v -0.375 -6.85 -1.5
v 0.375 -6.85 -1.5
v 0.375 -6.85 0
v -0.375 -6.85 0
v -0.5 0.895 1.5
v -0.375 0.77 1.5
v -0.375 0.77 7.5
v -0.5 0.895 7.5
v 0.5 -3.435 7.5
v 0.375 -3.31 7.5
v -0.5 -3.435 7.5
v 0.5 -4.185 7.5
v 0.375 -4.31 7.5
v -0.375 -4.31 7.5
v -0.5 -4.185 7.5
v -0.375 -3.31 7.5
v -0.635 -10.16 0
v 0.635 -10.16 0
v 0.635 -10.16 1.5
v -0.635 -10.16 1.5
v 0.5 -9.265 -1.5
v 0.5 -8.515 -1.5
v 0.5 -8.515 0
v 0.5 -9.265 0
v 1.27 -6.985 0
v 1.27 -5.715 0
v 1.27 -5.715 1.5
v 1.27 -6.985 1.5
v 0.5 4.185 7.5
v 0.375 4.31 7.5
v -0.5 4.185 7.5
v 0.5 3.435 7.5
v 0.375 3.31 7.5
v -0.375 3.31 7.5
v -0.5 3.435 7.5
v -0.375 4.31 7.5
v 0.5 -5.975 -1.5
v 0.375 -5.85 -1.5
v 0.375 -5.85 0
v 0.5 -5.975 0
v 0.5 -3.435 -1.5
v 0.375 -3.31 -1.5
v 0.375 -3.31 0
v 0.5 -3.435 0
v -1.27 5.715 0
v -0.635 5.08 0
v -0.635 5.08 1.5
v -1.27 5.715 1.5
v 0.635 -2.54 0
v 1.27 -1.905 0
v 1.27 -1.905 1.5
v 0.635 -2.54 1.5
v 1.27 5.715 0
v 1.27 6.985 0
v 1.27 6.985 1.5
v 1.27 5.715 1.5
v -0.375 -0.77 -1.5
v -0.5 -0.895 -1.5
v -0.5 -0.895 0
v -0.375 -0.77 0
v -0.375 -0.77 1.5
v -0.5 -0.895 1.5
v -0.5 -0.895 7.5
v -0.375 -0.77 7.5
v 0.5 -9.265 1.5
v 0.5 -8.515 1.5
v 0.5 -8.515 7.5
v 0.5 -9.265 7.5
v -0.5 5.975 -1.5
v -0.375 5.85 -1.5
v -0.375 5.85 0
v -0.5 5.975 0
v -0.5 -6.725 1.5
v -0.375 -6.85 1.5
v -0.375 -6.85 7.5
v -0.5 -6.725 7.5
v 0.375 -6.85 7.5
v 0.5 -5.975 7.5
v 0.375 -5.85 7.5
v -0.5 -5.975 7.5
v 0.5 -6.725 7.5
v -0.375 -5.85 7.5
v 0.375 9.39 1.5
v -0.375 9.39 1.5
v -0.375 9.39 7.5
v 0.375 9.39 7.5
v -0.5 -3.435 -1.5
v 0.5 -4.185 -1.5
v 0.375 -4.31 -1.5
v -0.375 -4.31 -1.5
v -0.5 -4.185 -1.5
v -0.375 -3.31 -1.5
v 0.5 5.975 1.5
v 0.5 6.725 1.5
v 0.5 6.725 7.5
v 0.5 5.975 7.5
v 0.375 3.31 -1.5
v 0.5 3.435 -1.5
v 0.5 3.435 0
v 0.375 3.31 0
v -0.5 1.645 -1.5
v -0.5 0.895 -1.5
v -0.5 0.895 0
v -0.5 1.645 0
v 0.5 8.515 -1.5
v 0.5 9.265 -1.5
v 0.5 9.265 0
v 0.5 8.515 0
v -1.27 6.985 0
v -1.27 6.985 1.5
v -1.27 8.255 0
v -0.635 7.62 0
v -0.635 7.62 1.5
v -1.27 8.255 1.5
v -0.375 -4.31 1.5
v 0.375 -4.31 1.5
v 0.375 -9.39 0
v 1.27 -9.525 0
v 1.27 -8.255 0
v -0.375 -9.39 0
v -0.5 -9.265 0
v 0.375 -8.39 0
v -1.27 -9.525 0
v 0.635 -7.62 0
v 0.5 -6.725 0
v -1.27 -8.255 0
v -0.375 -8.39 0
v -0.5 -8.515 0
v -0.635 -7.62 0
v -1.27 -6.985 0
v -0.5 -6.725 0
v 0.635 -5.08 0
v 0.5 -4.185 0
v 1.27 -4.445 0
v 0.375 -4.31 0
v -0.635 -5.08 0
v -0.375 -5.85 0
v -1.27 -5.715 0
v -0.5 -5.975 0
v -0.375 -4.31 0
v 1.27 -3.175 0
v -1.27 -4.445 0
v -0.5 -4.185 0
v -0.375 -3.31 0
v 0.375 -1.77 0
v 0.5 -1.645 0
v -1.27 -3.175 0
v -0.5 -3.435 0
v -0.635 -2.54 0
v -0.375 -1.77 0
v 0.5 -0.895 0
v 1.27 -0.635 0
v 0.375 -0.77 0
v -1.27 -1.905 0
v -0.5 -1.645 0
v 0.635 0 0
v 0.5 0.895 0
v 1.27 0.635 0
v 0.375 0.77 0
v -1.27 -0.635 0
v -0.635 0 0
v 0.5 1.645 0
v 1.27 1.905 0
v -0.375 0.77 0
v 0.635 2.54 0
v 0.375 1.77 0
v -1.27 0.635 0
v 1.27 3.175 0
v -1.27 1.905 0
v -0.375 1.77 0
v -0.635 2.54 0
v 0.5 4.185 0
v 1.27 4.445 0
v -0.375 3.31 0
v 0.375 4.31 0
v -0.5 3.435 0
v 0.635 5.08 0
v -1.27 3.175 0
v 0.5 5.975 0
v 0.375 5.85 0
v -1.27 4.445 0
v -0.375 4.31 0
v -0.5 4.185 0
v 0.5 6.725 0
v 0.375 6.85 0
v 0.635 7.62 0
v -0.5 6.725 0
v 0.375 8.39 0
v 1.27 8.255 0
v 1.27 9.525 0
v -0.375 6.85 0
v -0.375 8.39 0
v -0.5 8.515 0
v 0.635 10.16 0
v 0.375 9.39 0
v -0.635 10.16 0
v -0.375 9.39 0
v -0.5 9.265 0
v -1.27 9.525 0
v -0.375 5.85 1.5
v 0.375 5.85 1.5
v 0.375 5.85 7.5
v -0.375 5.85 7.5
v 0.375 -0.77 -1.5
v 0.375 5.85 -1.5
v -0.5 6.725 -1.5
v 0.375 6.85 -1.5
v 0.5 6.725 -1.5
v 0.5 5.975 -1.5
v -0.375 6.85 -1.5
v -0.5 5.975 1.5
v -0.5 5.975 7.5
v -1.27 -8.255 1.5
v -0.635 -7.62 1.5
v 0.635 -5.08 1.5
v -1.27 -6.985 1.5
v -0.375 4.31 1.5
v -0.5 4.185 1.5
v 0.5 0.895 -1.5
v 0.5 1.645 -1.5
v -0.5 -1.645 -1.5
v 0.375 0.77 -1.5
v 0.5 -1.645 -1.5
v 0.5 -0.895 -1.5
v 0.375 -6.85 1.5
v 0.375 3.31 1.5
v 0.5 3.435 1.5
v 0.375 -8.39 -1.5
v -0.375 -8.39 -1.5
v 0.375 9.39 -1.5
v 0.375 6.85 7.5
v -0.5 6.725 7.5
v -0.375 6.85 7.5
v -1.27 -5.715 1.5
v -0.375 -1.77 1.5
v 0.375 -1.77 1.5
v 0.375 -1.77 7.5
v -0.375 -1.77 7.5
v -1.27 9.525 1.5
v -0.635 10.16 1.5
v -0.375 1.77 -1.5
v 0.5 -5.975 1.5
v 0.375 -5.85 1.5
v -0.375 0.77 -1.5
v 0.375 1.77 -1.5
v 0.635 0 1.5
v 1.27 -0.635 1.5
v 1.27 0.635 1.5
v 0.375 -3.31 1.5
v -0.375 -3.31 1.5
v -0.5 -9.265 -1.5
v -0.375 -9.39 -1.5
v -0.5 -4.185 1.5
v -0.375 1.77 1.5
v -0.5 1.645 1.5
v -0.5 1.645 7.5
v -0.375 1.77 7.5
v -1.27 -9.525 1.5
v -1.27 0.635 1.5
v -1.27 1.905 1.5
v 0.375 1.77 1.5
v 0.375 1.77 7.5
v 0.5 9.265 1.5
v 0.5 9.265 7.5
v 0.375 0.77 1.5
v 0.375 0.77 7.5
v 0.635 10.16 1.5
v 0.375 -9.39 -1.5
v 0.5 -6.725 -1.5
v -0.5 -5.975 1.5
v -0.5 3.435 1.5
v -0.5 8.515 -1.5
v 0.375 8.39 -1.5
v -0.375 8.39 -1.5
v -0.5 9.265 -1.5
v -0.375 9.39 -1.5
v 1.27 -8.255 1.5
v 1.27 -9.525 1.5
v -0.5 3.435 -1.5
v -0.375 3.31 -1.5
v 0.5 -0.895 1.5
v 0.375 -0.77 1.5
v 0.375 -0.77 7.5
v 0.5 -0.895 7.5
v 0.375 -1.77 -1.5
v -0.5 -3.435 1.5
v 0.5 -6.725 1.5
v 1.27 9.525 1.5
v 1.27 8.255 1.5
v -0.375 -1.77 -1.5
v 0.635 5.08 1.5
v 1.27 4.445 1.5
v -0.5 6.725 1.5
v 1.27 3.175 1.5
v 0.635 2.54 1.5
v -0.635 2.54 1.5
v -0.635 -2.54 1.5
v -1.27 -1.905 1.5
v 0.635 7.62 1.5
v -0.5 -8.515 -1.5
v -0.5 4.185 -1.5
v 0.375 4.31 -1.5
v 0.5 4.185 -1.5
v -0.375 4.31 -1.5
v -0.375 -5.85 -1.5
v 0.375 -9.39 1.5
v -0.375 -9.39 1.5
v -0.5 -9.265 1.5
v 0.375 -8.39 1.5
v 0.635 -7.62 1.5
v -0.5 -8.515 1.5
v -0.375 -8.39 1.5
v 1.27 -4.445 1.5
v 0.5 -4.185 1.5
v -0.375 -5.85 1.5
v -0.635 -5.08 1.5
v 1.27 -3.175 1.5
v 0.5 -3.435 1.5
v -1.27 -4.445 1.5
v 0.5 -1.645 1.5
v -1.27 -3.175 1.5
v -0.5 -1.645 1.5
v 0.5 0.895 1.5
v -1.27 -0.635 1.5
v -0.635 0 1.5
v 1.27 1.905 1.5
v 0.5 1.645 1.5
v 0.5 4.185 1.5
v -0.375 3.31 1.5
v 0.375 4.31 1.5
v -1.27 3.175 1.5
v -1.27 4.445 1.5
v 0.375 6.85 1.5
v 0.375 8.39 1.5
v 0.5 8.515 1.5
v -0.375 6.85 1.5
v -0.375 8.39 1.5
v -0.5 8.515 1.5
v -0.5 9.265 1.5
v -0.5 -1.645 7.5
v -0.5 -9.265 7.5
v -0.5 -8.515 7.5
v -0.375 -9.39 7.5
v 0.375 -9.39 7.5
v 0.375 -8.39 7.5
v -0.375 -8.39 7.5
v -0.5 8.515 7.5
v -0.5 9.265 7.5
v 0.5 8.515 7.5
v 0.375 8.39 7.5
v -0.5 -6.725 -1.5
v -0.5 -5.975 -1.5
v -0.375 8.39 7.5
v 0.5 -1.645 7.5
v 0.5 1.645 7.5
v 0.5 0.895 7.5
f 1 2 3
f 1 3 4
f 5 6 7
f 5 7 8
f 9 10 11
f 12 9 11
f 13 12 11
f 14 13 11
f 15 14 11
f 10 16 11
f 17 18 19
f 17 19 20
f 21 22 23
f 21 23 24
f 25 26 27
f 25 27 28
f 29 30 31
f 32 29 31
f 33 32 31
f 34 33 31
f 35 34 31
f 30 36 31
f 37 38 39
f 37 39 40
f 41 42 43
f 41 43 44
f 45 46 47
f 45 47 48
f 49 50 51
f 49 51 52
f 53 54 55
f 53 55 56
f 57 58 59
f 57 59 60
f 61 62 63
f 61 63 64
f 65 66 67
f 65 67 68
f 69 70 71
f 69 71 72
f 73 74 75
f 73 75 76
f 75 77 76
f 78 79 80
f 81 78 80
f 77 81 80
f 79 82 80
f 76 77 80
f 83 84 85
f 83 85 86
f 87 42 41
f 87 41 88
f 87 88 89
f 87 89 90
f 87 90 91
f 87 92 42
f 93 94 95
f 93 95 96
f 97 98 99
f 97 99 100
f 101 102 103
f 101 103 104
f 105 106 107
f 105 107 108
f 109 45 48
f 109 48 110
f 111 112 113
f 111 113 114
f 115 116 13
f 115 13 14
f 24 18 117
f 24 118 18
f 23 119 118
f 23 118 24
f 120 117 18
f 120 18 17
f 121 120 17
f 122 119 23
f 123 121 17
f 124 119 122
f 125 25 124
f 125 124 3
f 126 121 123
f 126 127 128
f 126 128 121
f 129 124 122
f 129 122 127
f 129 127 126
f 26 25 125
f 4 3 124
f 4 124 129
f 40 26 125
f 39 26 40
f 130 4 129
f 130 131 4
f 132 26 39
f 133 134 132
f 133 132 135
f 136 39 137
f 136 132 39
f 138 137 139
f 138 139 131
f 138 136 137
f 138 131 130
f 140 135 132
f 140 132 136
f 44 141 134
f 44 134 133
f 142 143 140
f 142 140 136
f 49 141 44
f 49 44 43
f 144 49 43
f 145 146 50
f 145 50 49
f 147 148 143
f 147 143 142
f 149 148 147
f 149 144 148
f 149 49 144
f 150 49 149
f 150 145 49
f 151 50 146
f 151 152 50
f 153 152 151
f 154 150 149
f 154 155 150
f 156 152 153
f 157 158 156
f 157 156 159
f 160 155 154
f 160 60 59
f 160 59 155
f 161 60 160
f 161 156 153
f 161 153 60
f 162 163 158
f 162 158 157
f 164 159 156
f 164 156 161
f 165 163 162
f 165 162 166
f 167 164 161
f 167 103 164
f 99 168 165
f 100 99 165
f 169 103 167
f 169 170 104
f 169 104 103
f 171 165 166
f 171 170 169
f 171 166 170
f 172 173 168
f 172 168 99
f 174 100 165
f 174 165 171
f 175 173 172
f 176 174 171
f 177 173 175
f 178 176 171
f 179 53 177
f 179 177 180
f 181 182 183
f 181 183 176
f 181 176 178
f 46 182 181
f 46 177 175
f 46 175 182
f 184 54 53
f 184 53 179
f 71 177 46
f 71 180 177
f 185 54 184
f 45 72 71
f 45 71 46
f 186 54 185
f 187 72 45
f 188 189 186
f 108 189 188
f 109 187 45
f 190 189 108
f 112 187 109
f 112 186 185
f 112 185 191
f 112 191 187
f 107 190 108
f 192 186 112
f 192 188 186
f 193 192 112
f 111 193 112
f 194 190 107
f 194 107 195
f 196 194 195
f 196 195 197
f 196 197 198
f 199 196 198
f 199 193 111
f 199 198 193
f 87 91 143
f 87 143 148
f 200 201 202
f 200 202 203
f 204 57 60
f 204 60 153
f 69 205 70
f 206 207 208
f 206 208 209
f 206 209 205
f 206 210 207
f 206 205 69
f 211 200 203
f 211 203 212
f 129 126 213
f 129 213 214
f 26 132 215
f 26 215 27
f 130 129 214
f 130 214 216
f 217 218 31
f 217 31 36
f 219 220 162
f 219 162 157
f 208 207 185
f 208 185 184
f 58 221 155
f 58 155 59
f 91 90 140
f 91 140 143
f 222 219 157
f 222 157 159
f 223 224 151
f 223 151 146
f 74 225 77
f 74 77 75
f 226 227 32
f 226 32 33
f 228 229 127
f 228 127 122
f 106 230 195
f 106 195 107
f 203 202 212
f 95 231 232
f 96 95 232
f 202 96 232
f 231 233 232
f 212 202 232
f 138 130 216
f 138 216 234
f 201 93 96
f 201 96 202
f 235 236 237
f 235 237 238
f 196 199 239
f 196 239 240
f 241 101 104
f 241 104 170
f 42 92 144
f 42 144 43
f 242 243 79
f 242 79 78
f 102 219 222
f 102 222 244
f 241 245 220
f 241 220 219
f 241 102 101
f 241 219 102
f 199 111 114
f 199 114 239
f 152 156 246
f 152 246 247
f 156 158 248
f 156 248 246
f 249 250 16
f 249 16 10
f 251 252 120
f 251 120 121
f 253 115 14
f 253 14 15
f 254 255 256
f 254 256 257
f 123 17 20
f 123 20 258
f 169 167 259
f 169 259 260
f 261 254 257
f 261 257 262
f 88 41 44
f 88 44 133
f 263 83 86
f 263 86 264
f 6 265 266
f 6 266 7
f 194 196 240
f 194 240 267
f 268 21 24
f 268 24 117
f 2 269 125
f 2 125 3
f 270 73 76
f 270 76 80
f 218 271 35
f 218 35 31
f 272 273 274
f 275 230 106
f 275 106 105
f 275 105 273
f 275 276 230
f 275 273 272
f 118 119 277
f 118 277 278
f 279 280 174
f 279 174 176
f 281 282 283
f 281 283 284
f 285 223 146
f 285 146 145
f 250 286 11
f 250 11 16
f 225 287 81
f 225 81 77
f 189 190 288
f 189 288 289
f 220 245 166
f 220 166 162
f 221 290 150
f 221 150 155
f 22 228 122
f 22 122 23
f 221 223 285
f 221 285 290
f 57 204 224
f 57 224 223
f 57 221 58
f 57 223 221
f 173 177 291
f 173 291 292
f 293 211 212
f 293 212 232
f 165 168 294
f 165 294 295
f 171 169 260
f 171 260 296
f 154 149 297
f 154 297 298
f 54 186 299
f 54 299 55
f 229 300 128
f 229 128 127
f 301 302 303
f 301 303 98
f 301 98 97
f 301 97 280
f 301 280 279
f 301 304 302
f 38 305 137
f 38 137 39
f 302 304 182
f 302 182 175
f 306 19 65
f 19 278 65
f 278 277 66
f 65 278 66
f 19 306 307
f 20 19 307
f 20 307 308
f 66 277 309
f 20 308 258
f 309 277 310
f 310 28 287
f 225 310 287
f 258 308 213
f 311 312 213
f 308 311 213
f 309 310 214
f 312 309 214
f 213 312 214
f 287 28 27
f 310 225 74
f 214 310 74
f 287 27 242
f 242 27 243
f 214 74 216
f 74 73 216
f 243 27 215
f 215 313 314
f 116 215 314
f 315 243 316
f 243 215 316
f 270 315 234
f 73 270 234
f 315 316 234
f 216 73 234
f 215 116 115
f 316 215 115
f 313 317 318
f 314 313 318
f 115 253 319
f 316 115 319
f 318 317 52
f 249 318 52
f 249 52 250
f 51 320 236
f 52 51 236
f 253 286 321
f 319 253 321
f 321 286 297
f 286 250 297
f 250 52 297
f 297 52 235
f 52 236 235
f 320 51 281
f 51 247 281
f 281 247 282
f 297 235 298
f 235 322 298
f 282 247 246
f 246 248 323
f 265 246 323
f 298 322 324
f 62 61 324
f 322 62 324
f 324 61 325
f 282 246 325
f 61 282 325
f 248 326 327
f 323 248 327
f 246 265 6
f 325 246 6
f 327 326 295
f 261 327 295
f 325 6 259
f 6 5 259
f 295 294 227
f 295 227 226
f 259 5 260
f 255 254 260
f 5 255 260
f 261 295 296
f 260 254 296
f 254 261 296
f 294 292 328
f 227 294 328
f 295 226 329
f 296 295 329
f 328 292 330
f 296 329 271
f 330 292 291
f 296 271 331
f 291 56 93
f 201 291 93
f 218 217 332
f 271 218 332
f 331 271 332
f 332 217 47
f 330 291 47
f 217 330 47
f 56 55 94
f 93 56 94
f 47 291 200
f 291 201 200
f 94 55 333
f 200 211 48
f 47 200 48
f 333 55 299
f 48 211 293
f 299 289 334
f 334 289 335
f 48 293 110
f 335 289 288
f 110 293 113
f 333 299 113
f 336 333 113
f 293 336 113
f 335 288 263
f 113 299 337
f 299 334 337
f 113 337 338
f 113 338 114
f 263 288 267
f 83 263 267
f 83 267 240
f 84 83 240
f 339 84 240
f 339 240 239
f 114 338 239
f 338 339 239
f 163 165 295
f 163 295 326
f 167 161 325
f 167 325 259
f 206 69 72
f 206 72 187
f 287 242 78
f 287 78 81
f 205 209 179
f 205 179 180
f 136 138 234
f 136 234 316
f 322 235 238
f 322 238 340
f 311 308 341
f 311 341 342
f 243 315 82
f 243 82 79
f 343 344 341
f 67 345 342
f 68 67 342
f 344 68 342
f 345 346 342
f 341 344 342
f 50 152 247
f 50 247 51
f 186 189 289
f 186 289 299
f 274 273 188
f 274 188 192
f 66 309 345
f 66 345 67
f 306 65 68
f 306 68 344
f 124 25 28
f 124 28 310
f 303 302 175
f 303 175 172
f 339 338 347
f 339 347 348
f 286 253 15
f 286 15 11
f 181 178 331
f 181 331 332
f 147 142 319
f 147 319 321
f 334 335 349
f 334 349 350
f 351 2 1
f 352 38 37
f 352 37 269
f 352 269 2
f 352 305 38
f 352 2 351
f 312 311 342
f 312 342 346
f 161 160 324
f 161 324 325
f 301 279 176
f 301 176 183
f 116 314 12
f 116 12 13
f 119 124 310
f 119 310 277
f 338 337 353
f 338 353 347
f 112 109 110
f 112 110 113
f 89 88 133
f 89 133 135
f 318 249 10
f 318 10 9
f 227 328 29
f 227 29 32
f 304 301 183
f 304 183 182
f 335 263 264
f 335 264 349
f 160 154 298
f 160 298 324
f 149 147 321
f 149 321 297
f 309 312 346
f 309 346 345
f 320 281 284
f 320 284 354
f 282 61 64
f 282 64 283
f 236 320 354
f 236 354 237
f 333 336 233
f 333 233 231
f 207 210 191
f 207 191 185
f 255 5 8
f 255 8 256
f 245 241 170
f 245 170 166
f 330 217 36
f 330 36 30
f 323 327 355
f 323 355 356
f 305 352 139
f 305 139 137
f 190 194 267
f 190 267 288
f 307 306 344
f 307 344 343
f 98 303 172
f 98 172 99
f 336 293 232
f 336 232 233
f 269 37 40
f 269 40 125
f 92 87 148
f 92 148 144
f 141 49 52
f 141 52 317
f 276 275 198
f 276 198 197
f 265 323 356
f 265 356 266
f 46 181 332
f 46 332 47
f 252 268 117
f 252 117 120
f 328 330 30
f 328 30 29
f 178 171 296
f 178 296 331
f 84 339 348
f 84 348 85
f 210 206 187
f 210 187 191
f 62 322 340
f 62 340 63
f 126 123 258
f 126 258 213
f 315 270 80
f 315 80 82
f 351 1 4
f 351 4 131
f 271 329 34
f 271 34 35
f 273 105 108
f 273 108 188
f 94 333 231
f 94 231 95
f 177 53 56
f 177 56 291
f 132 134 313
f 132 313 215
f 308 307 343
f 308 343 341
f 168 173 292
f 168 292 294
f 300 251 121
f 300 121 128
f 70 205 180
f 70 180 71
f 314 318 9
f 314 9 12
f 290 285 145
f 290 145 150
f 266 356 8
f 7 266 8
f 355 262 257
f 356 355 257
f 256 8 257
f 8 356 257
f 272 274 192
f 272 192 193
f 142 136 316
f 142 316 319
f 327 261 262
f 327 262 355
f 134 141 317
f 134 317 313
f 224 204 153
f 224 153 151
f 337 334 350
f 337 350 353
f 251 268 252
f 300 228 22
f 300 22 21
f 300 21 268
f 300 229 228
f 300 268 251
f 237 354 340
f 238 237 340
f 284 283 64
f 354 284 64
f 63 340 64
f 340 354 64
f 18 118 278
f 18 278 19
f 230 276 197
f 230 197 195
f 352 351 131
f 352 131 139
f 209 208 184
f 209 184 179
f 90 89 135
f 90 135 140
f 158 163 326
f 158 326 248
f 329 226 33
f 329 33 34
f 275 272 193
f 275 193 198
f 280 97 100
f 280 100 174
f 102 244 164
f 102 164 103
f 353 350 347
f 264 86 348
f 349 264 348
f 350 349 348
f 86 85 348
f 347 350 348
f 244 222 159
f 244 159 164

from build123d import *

# Parameters (mm, degrees)
BOSS_EXTRUDE1_DEPTH      = 1.5
BOSS_EXTRUDE2_DEPTH      = 6
BOSS_EXTRUDE2_DEPTH_BACK = 3


with BuildPart() as part:
    # Sketch1 → Boss-Extrude1 (new body)
    with BuildSketch(Plane.XY):
        Polygon((-0.635, 10.16), (0.635, 10.16), (1.27, 9.525), (1.27, 8.255), (0.635, 7.62), (1.27, 6.985), (1.27, 5.715), (0.635, 5.08), (1.27, 4.445), (1.27, 3.175), (0.635, 2.54), (1.27, 1.905), (1.27, 0.635), (0.635, 0), (1.27, -0.635), (1.27, -1.905), (0.635, -2.54), (1.27, -3.175), (1.27, -4.445), (0.635, -5.08), (1.27, -5.715), (1.27, -6.985), (0.635, -7.62), (1.27, -8.255), (1.27, -9.525), (0.635, -10.16), (-0.635, -10.16), (-1.27, -9.525), (-1.27, -8.255), (-0.635, -7.62), (-1.27, -6.985), (-1.27, -5.715), (-0.635, -5.08), (-1.27, -4.445), (-1.27, -3.175), (-0.635, -2.54), (-1.27, -1.905), (-1.27, -0.635), (-0.635, 0), (-1.27, 0.635), (-1.27, 1.905), (-0.635, 2.54), (-1.27, 3.175), (-1.27, 4.445), (-0.635, 5.08), (-1.27, 5.715), (-1.27, 6.985), (-0.635, 7.62), (-1.27, 8.255), (-1.27, 9.525), align=None)
    extrude(amount=BOSS_EXTRUDE1_DEPTH)

    # Sketch2 → Boss-Extrude2 (add, two sides: drawn at the far end of the back side and taken through both)
    with BuildSketch(Plane.XY.offset(1.5).offset(-BOSS_EXTRUDE2_DEPTH_BACK)):
        Polygon((0.375, 9.39), (0.5, 9.265), (0.5, 8.515), (0.375, 8.39), (-0.375, 8.39), (-0.5, 8.515), (-0.5, 9.265), (-0.375, 9.39), align=None)
        Polygon((0.375, 6.85), (0.5, 6.725), (0.5, 5.975), (0.375, 5.85), (-0.375, 5.85), (-0.5, 5.975), (-0.5, 6.725), (-0.375, 6.85), align=None)
        Polygon((0.375, 4.31), (0.5, 4.185), (0.5, 3.435), (0.375, 3.31), (-0.375, 3.31), (-0.5, 3.435), (-0.5, 4.185), (-0.375, 4.31), align=None)
        Polygon((0.375, 1.77), (0.5, 1.645), (0.5, 0.895), (0.375, 0.77), (-0.375, 0.77), (-0.5, 0.895), (-0.5, 1.645), (-0.375, 1.77), align=None)
        Polygon((0.375, -0.77), (0.5, -0.895), (0.5, -1.645), (0.375, -1.77), (-0.375, -1.77), (-0.5, -1.645), (-0.5, -0.895), (-0.375, -0.77), align=None)
        Polygon((0.375, -3.31), (0.5, -3.435), (0.5, -4.185), (0.375, -4.31), (-0.375, -4.31), (-0.5, -4.185), (-0.5, -3.435), (-0.375, -3.31), align=None)
        Polygon((0.375, -5.85), (0.5, -5.975), (0.5, -6.725), (0.375, -6.85), (-0.375, -6.85), (-0.5, -6.725), (-0.5, -5.975), (-0.375, -5.85), align=None)
        Polygon((0.375, -8.39), (0.5, -8.515), (0.5, -9.265), (0.375, -9.39), (-0.375, -9.39), (-0.5, -9.265), (-0.5, -8.515), (-0.375, -8.39), align=None)
    extrude(amount=BOSS_EXTRUDE2_DEPTH + BOSS_EXTRUDE2_DEPTH_BACK)


solid = part.part
